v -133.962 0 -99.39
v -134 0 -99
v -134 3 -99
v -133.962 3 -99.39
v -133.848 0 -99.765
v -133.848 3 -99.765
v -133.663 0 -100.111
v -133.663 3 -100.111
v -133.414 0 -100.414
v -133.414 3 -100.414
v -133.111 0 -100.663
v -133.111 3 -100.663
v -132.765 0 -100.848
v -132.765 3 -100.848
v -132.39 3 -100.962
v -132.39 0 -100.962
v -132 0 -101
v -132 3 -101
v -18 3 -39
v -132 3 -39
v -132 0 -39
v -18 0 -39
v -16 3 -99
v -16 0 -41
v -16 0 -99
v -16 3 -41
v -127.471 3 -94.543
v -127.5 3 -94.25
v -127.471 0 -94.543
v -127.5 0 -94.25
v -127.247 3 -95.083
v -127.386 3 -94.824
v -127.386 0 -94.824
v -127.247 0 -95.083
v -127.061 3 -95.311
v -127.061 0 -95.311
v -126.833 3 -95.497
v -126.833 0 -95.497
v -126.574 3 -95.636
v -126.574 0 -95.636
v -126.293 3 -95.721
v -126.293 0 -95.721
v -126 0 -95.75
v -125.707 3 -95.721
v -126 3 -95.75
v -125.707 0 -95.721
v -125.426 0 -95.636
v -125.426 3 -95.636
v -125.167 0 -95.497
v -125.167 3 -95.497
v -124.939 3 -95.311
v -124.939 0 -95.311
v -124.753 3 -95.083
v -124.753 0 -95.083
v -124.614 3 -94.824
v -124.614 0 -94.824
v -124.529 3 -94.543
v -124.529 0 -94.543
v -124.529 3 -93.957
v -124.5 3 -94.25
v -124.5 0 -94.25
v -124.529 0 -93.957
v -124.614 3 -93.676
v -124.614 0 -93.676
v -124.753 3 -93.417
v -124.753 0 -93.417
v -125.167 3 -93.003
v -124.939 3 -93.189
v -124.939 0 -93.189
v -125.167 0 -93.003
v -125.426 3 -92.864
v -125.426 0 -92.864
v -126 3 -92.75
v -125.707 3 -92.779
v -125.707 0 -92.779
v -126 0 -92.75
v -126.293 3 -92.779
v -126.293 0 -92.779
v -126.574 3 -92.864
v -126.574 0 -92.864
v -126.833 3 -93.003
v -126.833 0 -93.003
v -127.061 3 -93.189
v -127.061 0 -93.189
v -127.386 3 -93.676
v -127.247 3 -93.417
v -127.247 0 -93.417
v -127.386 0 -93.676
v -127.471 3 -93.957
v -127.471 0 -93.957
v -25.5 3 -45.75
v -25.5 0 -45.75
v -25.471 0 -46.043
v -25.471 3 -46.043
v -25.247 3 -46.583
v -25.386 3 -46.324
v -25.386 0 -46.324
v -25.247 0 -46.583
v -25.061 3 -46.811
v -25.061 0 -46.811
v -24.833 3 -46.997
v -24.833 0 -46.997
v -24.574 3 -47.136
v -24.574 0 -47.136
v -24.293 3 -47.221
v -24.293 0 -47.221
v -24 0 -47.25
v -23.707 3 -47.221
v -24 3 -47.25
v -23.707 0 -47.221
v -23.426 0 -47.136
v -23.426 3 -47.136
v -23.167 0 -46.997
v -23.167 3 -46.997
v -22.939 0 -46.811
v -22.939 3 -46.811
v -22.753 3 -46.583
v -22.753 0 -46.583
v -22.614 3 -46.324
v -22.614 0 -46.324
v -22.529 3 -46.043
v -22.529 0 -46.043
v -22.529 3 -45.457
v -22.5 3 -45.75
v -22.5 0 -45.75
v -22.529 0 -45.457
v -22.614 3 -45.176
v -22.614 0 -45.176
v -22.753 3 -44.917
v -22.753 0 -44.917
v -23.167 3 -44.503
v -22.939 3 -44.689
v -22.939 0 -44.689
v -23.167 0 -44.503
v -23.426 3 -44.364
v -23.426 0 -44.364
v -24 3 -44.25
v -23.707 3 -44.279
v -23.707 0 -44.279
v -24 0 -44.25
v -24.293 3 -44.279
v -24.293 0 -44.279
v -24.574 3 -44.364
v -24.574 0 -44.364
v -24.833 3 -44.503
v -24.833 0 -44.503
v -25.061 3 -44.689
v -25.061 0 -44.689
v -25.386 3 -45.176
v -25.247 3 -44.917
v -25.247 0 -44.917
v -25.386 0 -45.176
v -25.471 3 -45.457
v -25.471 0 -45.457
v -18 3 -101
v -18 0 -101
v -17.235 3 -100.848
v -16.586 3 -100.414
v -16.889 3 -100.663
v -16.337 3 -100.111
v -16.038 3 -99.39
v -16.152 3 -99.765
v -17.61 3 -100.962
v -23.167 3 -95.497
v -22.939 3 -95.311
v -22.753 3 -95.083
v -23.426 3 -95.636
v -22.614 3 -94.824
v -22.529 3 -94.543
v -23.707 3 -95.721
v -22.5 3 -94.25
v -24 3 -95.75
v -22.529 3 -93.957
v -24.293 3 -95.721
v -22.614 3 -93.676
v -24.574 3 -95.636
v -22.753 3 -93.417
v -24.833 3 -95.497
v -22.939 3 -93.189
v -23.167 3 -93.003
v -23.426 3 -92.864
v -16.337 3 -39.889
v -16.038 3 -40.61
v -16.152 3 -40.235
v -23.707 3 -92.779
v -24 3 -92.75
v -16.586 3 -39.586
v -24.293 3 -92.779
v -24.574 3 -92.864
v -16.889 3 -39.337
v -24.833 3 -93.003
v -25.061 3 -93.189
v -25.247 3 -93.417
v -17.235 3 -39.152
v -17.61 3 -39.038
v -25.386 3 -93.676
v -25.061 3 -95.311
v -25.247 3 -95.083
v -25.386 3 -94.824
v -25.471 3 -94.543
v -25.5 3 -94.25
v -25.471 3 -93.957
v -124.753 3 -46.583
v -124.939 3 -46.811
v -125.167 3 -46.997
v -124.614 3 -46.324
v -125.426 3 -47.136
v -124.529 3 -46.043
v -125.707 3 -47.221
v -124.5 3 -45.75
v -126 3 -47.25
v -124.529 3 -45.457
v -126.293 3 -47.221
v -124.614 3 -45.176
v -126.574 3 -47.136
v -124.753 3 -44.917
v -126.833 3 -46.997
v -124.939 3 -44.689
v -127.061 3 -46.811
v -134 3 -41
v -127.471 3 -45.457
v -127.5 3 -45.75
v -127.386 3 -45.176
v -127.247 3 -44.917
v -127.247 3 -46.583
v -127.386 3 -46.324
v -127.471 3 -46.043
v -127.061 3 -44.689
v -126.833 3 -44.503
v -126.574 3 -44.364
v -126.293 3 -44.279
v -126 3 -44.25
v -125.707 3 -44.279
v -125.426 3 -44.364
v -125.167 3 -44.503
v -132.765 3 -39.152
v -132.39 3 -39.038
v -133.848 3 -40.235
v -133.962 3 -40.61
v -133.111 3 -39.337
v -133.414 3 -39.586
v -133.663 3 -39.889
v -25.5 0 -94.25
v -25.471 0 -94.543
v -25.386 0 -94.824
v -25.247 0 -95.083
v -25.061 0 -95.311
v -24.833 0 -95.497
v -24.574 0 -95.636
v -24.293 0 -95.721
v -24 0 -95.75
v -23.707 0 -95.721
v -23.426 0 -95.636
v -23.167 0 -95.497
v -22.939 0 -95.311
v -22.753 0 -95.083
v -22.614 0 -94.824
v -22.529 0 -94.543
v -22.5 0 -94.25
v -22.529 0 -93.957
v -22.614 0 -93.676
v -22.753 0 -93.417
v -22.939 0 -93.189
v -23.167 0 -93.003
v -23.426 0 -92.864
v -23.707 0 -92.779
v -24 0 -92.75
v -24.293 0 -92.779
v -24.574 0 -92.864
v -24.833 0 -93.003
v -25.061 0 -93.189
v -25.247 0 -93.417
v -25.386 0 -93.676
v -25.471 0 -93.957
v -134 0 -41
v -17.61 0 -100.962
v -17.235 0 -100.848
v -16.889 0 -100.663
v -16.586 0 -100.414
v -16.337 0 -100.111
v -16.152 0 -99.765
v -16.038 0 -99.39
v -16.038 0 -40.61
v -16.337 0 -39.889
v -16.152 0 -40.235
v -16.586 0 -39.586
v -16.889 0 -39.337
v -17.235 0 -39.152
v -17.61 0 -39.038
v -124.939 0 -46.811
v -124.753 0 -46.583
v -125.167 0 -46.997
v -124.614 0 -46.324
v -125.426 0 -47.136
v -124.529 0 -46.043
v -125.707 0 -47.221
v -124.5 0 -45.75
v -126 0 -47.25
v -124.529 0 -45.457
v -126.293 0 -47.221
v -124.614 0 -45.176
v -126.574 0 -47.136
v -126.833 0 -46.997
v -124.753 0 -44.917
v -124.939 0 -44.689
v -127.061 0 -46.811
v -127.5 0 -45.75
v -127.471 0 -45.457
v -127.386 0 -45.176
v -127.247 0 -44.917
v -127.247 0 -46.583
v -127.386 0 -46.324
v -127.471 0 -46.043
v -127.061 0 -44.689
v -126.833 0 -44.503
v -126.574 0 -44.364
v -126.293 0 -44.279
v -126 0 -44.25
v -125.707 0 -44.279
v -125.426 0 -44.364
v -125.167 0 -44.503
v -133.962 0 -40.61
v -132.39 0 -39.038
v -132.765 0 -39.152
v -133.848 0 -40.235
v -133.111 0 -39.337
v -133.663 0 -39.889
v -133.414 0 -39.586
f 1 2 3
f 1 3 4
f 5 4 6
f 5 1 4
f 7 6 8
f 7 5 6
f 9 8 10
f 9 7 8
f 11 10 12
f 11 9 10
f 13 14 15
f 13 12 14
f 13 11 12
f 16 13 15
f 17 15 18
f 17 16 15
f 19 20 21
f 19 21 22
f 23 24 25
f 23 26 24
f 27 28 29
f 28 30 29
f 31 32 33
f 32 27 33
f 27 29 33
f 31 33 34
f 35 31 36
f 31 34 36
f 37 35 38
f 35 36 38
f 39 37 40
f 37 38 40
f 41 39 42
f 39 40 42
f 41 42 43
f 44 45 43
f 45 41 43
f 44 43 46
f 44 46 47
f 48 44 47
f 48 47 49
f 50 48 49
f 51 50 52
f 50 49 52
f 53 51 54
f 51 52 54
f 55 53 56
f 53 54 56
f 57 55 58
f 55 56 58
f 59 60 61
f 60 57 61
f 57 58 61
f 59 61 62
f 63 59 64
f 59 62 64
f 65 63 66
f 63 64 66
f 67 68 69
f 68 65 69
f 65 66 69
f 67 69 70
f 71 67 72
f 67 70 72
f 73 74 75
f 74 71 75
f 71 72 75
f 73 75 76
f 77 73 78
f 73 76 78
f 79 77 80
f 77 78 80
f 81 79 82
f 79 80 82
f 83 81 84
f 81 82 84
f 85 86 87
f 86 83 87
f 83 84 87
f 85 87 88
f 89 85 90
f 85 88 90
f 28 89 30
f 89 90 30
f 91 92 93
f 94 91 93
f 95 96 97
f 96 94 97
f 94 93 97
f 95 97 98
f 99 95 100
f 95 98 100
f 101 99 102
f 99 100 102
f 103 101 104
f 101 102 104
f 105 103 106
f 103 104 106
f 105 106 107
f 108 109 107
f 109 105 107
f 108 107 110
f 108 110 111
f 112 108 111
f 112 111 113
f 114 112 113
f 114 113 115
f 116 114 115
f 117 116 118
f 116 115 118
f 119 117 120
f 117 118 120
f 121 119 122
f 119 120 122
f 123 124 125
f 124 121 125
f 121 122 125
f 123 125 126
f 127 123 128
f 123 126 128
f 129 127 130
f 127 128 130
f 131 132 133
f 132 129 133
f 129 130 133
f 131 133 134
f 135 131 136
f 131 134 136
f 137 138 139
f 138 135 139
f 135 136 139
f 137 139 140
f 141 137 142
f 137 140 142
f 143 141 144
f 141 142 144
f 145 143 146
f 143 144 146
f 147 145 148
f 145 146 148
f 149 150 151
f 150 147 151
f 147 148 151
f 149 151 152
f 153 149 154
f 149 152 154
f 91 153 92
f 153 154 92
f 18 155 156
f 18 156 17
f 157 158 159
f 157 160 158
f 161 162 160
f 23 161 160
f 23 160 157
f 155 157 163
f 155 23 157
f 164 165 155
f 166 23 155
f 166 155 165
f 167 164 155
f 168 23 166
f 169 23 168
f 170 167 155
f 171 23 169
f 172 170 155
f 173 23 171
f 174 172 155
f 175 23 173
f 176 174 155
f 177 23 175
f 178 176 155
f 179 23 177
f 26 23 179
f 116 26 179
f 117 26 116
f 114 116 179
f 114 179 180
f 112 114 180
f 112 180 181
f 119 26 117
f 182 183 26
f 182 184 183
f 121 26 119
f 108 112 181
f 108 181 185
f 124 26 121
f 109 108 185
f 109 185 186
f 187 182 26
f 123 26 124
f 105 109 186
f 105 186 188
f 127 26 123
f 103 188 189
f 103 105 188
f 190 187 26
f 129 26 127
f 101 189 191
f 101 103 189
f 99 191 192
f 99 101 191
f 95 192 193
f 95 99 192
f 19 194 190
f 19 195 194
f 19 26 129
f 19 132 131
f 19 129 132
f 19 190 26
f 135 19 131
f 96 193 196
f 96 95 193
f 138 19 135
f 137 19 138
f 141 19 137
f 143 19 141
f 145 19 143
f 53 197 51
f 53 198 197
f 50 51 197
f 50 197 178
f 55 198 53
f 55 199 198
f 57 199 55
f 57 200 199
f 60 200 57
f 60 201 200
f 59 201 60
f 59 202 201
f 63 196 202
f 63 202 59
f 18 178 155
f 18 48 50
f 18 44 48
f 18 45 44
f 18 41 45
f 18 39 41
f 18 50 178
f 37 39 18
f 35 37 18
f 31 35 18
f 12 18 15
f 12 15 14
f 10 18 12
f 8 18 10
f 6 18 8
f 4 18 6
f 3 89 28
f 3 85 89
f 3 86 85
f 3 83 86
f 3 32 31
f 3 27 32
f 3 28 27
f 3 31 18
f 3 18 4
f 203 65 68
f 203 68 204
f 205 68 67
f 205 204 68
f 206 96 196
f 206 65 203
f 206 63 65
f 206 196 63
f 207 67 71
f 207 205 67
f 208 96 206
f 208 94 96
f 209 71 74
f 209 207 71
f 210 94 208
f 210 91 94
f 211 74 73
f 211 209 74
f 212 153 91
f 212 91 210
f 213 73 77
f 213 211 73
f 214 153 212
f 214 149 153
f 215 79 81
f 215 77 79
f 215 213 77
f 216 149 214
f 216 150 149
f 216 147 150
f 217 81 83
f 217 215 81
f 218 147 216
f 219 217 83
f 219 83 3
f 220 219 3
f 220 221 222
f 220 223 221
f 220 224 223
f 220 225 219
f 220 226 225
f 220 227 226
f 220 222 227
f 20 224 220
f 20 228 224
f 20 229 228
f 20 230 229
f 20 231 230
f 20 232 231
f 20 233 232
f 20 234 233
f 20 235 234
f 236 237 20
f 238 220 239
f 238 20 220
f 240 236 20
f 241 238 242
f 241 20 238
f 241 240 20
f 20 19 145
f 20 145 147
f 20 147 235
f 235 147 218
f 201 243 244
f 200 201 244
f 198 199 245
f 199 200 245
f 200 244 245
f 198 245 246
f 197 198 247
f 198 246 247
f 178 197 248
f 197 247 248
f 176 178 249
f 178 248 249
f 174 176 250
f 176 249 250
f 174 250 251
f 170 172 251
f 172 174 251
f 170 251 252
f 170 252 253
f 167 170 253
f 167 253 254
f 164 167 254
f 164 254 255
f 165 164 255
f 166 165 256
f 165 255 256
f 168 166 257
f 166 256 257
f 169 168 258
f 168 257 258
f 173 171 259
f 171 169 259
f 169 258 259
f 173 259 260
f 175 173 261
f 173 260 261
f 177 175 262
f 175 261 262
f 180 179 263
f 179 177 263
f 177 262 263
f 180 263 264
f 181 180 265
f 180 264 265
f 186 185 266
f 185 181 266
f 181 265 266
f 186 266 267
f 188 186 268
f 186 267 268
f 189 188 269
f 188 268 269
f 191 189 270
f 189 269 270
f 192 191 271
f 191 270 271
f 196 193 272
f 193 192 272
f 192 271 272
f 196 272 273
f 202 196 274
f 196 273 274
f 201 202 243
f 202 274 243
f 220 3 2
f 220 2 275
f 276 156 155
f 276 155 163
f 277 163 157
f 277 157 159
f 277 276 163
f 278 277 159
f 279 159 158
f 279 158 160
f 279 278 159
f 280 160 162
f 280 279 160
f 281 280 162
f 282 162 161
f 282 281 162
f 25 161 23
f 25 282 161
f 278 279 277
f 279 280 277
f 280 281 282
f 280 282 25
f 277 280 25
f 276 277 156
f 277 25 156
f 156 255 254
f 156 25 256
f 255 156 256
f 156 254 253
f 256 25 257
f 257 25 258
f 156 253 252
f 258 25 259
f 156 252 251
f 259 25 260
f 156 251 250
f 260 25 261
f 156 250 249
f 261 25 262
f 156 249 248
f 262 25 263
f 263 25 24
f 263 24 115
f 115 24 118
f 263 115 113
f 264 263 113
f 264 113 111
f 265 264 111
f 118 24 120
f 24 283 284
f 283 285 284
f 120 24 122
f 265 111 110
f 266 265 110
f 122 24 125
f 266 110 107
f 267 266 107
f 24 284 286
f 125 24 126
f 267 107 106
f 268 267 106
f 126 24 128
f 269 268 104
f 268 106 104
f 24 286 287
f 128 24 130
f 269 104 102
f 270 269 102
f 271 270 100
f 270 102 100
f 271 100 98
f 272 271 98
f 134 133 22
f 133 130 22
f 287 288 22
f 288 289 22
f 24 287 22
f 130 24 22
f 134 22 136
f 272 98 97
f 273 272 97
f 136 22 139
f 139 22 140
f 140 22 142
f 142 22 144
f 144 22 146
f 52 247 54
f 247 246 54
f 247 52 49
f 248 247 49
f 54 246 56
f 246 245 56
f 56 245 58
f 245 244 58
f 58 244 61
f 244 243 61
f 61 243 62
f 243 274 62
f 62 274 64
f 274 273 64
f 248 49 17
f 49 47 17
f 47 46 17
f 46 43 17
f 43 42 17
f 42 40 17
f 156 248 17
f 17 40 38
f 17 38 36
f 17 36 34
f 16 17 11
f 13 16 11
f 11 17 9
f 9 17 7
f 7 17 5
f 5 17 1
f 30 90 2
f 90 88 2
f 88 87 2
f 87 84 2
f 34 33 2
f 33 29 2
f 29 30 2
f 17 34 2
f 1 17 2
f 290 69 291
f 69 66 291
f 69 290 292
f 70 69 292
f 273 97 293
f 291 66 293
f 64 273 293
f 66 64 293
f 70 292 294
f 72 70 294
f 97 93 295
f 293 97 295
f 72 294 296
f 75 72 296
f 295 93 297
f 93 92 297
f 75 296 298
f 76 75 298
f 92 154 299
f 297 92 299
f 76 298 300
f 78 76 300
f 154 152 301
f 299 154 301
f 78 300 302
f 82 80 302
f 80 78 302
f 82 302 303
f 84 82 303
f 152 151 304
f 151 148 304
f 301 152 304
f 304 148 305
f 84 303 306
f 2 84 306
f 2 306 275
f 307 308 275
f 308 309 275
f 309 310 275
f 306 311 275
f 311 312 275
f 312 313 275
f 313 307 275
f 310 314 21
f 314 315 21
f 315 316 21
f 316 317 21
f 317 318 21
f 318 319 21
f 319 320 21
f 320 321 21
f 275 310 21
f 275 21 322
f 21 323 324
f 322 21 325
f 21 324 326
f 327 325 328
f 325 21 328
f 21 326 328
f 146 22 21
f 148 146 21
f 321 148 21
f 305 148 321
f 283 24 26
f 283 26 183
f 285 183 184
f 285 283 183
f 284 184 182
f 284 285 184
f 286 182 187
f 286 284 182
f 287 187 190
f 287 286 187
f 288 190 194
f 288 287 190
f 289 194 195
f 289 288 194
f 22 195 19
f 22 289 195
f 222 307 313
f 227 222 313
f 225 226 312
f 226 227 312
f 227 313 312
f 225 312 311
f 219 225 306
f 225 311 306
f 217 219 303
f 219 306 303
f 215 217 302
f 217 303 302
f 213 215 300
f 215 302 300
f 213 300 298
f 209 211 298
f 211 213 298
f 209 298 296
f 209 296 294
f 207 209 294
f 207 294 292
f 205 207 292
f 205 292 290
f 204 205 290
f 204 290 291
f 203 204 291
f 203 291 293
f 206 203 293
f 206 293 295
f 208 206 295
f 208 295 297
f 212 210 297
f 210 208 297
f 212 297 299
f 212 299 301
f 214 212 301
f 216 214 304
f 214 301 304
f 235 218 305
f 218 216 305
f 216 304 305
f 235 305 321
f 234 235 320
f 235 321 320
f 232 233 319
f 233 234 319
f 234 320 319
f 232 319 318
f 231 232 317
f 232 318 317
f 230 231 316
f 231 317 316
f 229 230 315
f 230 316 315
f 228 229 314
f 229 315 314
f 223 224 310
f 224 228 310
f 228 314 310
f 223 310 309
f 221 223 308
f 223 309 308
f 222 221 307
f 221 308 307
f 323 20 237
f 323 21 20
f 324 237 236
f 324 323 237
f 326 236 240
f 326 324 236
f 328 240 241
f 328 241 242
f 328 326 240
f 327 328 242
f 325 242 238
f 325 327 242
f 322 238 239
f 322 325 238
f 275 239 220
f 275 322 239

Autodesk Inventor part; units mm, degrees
ref_plane "YZ Plane" through (0, 0, 0) normal (1, 0, 0) x (0, 1, 0)
ref_plane "XZ Plane" through (0, 0, 0) normal (0, 1, 0) x (-1, 0, 0)
ref_plane "XY Plane" through (0, 0, 0) normal (0, 0, 1) x (1, 0, 0)
sketch "Sketch1" plane through (0, 0, 0) normal (0, 1, 0) x (-1, 0, 0)
  line L0 (0, 0) -> (150, 0)
  line L1 (150, 0) -> (150, -140)
  line L2 (150, -140) -> (0, -140)
  line L3 (0, -140) -> (0, 0)
  line L4 (150, -70) -> (0, -70) construction
  line L5 (24, -45.75) -> (126, -45.75) construction
  line L6 (126, -45.75) -> (126, -94.25) construction
  line L7 (126, -94.25) -> (24, -94.25) construction
  line L8 (24, -94.25) -> (24, -45.75) construction
  line L9 (24, -45.75) -> (126, -94.25) construction
  line L10 (126, -45.75) -> (24, -94.25) construction
  circle A0 centre (126, -45.75) radius 1.5
  circle A1 centre (126, -94.25) radius 1.5
  circle A2 centre (24, -94.25) radius 1.5
  circle A3 centre (24, -45.75) radius 1.5
  point P0 (75, -70)
  dimension "d0" = 150
  dimension "d1" = 140
  dimension "d2" = 102
  dimension "d3" = 48.5
  dimension "d4" = 3
  dimension "d5" = 3
  dimension "d6" = 3
  dimension "d7" = 3
extrude "Extrusion1" add sketch "Sketch1" along normal blind 3
sketch "Sketch2" plane through (0, 3, 0) normal (0, 1, 0) x (1, 0, 0)
  line L0 (-150, 140) -> (-150, 0) projected
  line L1 (-150, 50) -> (-147, 50)
  line L2 (-147, 50) -> (-147, 90)
  line L3 (-147, 90) -> (-150, 90)
  line L4 (-150, 90) -> (-150, 50)
  line L5 (-147, 70) -> (-150, 70) construction
  line L6 (0, 0) -> (0, 140) projected
  line L7 (0, 70) -> (-150, 70) construction
  line L8 (-150, 0) -> (0, 0) projected
  line L9 (-75, 0) -> (-75, 98) construction
  line L10 (-95, 0) -> (-55, 0)
  line L11 (-55, 0) -> (-55, 3)
  line L12 (-55, 3) -> (-95, 3)
  line L13 (-95, 3) -> (-95, 0)
  line L14 (-75, 3) -> (-75, 0) construction
  line L15 (0, 50) -> (-3, 50)
  line L16 (-3, 50) -> (-3, 90)
  line L17 (-3, 90) -> (0, 90)
  line L18 (0, 90) -> (0, 50)
  line L19 (-3, 70) -> (0, 70) construction
  line L20 (-95, 140) -> (-55, 140)
  line L21 (-55, 140) -> (-55, 137)
  line L22 (-55, 137) -> (-95, 137)
  line L23 (-95, 137) -> (-95, 140)
  line L24 (-75, 137) -> (-75, 140) construction
  point P0 (0, 50)
  point P1 (0, 90)
  point P2 (-55, 0)
  dimension "d10" = 40
  dimension "d11" = 3
  dimension "d12" = 40
  dimension "d13" = 3
extrude "Extrusion2" cut sketch "Sketch2" against normal blind 5
sketch "Sketch3" plane through (0, 3, 0) normal (0, 1, 0) x (1, 0, 0)
  line L0 (-147, 50) -> (-147, 90) projected
  line L1 (-147, 70) -> (-3, 70) construction
  line L2 (-3, 50) -> (-3, 90) projected
  line L3 (-134, 39) -> (-16, 39)
  line L4 (-16, 39) -> (-16, 101)
  line L5 (-16, 101) -> (-134, 101)
  line L6 (-134, 101) -> (-134, 39)
  line L7 (-134, 39) -> (-16, 101) construction
  line L8 (-16, 39) -> (-134, 101) construction
  point P0 (0, 0)
  point P1 (-75, 70)
  dimension "d16" = 118
  dimension "d17" = 62
extrude "Extrusion3" cut sketch "Sketch3" against normal blind 10 keep common part
fillet "Fillet1" radius 2 4 edges at (-16, 1.5, -39) (-16, 1.5, -101) (-134, 1.5, -39) (-134, 1.5, -101)
properties part number "Spacer"
